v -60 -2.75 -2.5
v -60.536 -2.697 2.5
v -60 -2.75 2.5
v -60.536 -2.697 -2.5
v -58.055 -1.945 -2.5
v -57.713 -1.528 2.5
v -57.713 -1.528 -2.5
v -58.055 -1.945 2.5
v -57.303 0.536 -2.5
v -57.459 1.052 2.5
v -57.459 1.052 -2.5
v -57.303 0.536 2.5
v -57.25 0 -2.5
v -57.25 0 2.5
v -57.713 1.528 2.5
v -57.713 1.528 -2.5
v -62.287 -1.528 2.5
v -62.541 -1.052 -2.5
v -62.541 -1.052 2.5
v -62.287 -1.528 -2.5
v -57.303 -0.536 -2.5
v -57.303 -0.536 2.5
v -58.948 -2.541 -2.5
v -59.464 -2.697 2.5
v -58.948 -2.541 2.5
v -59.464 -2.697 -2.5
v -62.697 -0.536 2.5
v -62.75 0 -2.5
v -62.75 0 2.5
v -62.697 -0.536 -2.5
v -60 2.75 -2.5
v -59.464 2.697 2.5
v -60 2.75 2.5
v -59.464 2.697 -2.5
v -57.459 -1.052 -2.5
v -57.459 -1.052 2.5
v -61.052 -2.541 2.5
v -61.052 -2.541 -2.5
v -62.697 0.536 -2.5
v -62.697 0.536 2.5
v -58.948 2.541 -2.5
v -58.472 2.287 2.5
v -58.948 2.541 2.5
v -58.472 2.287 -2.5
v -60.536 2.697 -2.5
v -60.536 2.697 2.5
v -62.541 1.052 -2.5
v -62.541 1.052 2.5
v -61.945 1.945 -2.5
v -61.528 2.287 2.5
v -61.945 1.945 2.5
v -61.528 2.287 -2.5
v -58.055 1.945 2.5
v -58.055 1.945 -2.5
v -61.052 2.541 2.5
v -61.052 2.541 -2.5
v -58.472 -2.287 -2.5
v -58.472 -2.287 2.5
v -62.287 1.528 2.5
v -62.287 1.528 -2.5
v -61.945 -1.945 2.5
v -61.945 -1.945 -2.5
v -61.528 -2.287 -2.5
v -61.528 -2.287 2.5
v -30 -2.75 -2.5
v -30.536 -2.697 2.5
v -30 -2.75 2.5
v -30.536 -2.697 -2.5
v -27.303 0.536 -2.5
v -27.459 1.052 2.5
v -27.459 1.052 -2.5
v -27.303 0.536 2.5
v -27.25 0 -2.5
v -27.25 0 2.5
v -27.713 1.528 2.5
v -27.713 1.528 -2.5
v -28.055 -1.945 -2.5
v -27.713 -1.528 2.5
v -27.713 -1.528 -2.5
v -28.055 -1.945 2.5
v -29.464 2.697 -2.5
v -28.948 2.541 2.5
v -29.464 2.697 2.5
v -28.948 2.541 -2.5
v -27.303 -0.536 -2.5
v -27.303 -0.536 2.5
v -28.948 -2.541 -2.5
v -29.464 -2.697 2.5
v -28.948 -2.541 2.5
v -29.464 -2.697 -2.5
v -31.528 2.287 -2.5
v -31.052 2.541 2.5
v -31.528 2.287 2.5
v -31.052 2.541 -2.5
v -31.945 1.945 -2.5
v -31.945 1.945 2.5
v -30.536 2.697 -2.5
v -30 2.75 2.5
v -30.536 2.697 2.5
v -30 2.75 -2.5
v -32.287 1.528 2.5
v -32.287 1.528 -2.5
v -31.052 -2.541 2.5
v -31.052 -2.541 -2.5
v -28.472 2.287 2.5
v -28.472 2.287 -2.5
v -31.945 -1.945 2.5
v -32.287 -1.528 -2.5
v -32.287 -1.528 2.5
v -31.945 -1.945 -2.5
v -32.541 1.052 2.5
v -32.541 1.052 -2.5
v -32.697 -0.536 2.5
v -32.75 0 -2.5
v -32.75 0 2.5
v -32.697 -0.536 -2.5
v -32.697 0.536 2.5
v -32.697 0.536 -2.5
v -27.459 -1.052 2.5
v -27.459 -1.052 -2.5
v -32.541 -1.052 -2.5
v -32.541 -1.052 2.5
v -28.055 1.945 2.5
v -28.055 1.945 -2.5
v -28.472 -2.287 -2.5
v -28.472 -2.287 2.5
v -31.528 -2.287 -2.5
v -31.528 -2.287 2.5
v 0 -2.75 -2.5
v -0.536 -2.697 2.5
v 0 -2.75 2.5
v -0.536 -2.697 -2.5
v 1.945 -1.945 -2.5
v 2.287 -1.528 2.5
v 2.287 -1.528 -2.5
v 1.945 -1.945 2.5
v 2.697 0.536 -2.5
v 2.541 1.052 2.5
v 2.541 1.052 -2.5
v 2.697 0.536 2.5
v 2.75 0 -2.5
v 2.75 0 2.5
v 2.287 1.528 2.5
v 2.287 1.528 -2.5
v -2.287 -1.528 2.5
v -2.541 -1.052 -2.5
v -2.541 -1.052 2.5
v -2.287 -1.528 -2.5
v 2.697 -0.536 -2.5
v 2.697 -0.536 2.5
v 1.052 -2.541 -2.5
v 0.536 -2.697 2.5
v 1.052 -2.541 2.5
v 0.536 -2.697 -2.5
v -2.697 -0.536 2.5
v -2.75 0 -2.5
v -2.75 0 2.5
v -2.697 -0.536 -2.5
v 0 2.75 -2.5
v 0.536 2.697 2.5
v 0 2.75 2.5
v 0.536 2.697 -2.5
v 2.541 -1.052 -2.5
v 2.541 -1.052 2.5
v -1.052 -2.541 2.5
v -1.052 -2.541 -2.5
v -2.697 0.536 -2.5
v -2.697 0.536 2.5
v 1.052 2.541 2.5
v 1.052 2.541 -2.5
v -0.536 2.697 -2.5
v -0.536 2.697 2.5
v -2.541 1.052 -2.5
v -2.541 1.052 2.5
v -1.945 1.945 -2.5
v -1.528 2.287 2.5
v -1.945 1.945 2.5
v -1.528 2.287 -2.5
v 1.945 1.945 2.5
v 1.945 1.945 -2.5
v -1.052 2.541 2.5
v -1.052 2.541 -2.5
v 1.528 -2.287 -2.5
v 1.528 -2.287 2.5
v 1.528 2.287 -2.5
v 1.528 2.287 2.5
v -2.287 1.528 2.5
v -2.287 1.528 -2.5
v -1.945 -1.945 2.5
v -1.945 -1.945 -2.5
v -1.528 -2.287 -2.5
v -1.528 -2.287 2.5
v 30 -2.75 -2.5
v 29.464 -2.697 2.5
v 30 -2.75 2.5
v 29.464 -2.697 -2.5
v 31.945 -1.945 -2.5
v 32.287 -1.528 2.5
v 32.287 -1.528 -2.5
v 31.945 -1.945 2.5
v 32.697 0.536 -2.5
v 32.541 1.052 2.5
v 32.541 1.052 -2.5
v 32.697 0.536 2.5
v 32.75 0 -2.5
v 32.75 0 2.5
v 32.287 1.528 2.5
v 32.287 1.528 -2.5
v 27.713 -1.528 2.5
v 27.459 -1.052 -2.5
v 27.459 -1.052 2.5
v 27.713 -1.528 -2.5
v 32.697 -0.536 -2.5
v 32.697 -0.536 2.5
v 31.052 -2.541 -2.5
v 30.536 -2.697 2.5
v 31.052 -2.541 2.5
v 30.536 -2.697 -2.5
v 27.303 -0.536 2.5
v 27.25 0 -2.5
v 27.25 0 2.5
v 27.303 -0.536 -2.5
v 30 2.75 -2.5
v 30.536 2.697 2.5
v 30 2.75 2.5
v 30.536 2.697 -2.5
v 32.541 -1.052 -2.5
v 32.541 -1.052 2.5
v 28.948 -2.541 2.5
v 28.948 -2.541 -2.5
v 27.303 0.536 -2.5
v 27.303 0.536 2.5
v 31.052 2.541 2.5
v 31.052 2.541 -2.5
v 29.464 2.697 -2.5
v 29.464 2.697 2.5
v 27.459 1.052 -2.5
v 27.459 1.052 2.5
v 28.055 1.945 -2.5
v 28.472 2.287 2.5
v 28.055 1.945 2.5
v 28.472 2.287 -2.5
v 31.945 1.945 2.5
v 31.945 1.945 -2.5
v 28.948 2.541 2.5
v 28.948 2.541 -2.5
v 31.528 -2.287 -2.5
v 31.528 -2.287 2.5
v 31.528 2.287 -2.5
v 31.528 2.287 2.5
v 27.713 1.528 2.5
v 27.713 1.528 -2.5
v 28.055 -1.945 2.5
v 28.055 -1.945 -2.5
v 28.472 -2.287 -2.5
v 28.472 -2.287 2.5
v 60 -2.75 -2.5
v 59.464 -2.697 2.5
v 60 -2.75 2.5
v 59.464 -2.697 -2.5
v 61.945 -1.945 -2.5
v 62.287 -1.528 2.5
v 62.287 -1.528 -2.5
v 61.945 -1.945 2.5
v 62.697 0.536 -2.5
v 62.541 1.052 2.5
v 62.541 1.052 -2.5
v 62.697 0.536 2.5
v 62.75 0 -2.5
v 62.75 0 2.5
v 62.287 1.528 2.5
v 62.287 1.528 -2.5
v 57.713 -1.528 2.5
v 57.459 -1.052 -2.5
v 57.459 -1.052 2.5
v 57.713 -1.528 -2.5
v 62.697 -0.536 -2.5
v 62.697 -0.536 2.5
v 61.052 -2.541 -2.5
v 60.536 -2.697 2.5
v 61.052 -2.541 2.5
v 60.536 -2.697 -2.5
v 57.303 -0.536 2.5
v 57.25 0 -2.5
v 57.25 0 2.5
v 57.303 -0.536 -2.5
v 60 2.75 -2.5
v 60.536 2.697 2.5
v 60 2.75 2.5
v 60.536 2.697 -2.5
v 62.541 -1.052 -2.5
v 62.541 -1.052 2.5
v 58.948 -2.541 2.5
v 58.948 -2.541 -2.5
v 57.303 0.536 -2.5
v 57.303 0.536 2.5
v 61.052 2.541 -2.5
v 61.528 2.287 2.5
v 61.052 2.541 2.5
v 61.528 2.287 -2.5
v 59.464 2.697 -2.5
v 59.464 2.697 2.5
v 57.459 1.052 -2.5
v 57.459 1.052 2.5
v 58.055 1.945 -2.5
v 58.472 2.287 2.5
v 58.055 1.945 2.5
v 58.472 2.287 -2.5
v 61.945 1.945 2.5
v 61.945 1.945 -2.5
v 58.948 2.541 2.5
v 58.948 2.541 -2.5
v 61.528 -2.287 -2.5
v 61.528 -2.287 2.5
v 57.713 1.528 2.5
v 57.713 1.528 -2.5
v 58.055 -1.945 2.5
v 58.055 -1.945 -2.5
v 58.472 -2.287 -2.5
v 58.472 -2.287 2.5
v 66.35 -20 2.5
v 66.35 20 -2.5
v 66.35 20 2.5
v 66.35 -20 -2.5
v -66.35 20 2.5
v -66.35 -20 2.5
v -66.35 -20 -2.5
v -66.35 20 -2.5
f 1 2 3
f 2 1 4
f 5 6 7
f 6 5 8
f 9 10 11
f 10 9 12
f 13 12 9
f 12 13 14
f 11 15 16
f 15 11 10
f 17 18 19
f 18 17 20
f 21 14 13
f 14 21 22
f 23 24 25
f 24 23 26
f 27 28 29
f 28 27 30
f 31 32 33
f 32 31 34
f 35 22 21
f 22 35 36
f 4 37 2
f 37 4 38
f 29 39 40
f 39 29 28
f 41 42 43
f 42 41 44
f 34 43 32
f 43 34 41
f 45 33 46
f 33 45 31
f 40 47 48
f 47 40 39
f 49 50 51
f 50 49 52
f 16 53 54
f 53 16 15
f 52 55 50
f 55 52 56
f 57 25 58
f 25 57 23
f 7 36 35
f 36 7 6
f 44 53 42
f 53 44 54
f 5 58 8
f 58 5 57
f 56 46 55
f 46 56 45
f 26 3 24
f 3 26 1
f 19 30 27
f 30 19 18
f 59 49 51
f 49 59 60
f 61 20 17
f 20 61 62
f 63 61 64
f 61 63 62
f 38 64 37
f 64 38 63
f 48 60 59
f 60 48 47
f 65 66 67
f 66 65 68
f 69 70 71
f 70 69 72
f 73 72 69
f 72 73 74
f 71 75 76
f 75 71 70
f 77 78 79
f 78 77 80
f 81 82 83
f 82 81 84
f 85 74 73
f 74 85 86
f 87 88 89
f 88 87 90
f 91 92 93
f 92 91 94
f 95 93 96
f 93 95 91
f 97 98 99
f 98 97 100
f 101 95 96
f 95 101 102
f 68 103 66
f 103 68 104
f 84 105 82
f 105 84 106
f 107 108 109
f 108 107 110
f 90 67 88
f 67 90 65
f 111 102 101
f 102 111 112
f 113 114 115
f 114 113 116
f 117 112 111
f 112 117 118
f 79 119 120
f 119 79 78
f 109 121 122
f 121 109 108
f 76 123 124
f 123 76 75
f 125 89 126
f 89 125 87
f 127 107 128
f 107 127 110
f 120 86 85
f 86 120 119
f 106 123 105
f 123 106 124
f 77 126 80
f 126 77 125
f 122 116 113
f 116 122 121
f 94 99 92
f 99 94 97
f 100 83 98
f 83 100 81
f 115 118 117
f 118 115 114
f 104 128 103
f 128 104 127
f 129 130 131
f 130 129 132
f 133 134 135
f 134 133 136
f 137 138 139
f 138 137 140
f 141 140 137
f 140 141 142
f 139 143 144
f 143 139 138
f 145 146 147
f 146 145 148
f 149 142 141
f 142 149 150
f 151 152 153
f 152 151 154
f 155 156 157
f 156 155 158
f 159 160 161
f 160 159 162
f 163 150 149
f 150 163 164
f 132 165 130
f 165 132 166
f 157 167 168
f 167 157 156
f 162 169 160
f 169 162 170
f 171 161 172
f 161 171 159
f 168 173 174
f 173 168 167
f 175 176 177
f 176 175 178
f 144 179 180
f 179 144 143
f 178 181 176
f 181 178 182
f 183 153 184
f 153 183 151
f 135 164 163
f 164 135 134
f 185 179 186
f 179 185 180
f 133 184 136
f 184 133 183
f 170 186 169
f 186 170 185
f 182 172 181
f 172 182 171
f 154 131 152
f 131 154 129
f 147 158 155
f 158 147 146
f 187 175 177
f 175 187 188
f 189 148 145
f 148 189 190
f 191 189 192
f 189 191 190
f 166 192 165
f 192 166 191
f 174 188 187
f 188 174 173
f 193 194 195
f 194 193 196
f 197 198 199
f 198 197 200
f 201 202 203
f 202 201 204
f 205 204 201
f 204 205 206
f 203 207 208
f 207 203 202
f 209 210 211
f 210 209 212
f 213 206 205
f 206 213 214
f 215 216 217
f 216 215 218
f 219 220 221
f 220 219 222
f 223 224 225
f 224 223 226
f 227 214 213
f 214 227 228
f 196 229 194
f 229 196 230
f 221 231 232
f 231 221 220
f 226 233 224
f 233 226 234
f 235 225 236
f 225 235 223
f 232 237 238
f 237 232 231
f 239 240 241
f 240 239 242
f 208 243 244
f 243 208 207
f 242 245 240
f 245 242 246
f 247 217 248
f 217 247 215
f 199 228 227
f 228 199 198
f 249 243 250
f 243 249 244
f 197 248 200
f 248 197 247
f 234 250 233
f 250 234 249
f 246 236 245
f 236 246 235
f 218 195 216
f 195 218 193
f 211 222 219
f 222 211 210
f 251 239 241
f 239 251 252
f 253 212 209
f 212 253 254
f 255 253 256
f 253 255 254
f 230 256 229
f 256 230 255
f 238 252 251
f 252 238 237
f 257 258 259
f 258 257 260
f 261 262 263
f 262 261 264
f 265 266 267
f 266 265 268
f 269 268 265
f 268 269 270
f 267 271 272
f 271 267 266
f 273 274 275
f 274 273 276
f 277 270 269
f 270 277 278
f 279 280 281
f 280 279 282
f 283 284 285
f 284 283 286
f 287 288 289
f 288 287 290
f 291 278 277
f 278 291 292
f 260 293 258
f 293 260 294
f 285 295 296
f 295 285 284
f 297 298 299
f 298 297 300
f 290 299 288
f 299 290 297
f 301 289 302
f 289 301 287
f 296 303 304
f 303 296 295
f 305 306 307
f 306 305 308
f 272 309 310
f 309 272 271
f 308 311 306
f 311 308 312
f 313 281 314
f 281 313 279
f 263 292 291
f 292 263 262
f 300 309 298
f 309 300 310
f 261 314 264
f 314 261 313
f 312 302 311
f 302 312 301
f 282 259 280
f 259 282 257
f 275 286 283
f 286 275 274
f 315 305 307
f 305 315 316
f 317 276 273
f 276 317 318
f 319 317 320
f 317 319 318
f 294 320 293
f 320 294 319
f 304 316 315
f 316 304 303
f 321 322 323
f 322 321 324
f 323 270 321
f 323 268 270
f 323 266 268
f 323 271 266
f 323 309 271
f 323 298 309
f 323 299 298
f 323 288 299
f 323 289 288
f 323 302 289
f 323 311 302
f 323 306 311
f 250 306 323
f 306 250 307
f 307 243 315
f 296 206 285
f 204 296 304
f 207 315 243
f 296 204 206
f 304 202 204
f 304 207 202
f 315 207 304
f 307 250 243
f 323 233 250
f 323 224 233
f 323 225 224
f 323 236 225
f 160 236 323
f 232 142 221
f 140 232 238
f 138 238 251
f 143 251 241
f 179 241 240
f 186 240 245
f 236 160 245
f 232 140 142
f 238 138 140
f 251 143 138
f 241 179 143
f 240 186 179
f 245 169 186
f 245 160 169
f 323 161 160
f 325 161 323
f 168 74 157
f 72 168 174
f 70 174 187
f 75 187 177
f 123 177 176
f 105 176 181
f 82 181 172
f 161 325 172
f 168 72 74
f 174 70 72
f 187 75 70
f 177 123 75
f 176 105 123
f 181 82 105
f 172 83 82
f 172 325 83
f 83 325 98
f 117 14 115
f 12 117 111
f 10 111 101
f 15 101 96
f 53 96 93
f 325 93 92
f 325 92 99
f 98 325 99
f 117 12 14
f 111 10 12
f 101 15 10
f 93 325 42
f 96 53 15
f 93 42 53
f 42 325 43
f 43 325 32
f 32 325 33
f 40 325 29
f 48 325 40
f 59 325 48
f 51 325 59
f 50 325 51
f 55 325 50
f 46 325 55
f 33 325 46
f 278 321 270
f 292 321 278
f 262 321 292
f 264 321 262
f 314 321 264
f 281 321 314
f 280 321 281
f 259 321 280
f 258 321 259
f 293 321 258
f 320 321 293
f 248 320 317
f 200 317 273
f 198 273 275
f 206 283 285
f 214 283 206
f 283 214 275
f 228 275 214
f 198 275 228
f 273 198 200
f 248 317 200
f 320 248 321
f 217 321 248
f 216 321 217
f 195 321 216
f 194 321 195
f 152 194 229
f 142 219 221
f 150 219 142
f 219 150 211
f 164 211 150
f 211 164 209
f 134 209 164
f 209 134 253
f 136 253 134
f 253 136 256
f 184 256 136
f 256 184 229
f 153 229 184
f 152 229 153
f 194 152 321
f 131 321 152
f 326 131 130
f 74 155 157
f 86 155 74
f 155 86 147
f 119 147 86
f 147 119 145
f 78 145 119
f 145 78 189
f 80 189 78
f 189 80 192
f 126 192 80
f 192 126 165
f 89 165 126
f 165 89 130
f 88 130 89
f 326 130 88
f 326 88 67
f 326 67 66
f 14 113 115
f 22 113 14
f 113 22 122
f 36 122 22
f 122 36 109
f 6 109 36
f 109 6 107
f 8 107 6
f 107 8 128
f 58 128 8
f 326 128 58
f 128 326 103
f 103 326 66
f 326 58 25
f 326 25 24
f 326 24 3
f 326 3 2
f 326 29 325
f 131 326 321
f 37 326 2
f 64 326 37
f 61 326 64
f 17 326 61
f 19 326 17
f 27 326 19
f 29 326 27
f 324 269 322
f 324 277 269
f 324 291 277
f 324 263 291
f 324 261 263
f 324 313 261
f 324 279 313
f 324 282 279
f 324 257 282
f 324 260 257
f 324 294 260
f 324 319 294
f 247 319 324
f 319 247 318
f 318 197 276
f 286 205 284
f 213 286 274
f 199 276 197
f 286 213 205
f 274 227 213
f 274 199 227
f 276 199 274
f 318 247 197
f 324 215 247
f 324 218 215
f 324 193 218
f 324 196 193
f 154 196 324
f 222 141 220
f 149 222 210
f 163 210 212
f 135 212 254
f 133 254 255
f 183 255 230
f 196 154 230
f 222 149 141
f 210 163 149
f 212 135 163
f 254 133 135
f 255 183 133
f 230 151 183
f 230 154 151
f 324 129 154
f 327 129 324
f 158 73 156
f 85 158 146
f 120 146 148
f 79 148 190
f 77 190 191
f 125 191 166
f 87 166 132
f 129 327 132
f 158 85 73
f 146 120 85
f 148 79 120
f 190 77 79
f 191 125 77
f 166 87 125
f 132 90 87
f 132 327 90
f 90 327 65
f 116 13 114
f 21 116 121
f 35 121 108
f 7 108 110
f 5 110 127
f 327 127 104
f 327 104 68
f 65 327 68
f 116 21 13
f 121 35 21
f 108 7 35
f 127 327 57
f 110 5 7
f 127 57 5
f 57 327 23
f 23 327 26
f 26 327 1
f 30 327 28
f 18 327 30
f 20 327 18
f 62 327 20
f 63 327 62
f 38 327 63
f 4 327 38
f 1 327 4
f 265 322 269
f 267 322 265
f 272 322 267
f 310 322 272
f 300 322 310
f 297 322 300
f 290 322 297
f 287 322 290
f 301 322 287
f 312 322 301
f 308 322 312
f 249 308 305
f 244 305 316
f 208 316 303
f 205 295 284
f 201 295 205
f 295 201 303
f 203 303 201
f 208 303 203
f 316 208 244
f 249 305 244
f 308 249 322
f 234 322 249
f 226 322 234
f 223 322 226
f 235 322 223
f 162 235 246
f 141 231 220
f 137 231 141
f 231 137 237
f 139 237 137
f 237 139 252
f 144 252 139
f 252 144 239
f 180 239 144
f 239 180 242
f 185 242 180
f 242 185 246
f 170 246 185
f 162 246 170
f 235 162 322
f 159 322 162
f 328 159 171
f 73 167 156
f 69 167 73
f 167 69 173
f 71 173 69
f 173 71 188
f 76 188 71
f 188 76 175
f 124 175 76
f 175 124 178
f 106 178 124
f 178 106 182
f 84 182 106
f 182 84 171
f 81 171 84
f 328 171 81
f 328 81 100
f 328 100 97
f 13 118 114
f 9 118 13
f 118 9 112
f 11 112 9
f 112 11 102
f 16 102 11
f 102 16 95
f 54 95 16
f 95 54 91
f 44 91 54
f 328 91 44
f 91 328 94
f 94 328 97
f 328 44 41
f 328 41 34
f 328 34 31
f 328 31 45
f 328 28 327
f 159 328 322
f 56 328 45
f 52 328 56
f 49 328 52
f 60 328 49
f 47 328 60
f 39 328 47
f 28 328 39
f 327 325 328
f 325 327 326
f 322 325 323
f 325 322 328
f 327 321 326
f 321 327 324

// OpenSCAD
$fn = 32;

// ----------------------------------------------------------------------
// Hole bar, 5 x Ø5.5
// skip layout, 6.35 mm edge offset
// ----------------------------------------------------------------------

// --- parameters (mm) ---
bar_w = 40;       // bar width (Y)
bar_t = 5;        // bar thickness (Z)
holes = 5;        // holes per row
hole_d = 5.5;     // hole diameter
edge = 6.35;      // offset from the bar end to the first hole
grid_pitch = 15;  // grid the bar was laid out on

// --- derived feature positions (mm) ---
pitch = grid_pitch * 2;       // = 30   holes sit every other grid slot
span = (holes - 1) * pitch;   // = 120   distance between the end holes
bar_l = span + 2 * edge;      // = 132.7   overall bar length
start_x = -bar_l / 2 + edge;  // = -60   X of the first hole
feature_centers = [
  [start_x + 0 * pitch, 0],
  [start_x + 1 * pitch, 0],
  [start_x + 2 * pitch, 0],
  [start_x + 3 * pitch, 0],
  [start_x + 4 * pitch, 0]
];   // hole centres of the first row

// bar with one row of holes, drilled from feature_centers
difference() {
  translate([-bar_l / 2, -bar_w / 2, -bar_t / 2]) cube([bar_l, bar_w, bar_t]);
  for (centre = feature_centers)
    translate([centre[0], centre[1], 0])
      cylinder(d = hole_d, h = bar_t + 2, center = true);
}
